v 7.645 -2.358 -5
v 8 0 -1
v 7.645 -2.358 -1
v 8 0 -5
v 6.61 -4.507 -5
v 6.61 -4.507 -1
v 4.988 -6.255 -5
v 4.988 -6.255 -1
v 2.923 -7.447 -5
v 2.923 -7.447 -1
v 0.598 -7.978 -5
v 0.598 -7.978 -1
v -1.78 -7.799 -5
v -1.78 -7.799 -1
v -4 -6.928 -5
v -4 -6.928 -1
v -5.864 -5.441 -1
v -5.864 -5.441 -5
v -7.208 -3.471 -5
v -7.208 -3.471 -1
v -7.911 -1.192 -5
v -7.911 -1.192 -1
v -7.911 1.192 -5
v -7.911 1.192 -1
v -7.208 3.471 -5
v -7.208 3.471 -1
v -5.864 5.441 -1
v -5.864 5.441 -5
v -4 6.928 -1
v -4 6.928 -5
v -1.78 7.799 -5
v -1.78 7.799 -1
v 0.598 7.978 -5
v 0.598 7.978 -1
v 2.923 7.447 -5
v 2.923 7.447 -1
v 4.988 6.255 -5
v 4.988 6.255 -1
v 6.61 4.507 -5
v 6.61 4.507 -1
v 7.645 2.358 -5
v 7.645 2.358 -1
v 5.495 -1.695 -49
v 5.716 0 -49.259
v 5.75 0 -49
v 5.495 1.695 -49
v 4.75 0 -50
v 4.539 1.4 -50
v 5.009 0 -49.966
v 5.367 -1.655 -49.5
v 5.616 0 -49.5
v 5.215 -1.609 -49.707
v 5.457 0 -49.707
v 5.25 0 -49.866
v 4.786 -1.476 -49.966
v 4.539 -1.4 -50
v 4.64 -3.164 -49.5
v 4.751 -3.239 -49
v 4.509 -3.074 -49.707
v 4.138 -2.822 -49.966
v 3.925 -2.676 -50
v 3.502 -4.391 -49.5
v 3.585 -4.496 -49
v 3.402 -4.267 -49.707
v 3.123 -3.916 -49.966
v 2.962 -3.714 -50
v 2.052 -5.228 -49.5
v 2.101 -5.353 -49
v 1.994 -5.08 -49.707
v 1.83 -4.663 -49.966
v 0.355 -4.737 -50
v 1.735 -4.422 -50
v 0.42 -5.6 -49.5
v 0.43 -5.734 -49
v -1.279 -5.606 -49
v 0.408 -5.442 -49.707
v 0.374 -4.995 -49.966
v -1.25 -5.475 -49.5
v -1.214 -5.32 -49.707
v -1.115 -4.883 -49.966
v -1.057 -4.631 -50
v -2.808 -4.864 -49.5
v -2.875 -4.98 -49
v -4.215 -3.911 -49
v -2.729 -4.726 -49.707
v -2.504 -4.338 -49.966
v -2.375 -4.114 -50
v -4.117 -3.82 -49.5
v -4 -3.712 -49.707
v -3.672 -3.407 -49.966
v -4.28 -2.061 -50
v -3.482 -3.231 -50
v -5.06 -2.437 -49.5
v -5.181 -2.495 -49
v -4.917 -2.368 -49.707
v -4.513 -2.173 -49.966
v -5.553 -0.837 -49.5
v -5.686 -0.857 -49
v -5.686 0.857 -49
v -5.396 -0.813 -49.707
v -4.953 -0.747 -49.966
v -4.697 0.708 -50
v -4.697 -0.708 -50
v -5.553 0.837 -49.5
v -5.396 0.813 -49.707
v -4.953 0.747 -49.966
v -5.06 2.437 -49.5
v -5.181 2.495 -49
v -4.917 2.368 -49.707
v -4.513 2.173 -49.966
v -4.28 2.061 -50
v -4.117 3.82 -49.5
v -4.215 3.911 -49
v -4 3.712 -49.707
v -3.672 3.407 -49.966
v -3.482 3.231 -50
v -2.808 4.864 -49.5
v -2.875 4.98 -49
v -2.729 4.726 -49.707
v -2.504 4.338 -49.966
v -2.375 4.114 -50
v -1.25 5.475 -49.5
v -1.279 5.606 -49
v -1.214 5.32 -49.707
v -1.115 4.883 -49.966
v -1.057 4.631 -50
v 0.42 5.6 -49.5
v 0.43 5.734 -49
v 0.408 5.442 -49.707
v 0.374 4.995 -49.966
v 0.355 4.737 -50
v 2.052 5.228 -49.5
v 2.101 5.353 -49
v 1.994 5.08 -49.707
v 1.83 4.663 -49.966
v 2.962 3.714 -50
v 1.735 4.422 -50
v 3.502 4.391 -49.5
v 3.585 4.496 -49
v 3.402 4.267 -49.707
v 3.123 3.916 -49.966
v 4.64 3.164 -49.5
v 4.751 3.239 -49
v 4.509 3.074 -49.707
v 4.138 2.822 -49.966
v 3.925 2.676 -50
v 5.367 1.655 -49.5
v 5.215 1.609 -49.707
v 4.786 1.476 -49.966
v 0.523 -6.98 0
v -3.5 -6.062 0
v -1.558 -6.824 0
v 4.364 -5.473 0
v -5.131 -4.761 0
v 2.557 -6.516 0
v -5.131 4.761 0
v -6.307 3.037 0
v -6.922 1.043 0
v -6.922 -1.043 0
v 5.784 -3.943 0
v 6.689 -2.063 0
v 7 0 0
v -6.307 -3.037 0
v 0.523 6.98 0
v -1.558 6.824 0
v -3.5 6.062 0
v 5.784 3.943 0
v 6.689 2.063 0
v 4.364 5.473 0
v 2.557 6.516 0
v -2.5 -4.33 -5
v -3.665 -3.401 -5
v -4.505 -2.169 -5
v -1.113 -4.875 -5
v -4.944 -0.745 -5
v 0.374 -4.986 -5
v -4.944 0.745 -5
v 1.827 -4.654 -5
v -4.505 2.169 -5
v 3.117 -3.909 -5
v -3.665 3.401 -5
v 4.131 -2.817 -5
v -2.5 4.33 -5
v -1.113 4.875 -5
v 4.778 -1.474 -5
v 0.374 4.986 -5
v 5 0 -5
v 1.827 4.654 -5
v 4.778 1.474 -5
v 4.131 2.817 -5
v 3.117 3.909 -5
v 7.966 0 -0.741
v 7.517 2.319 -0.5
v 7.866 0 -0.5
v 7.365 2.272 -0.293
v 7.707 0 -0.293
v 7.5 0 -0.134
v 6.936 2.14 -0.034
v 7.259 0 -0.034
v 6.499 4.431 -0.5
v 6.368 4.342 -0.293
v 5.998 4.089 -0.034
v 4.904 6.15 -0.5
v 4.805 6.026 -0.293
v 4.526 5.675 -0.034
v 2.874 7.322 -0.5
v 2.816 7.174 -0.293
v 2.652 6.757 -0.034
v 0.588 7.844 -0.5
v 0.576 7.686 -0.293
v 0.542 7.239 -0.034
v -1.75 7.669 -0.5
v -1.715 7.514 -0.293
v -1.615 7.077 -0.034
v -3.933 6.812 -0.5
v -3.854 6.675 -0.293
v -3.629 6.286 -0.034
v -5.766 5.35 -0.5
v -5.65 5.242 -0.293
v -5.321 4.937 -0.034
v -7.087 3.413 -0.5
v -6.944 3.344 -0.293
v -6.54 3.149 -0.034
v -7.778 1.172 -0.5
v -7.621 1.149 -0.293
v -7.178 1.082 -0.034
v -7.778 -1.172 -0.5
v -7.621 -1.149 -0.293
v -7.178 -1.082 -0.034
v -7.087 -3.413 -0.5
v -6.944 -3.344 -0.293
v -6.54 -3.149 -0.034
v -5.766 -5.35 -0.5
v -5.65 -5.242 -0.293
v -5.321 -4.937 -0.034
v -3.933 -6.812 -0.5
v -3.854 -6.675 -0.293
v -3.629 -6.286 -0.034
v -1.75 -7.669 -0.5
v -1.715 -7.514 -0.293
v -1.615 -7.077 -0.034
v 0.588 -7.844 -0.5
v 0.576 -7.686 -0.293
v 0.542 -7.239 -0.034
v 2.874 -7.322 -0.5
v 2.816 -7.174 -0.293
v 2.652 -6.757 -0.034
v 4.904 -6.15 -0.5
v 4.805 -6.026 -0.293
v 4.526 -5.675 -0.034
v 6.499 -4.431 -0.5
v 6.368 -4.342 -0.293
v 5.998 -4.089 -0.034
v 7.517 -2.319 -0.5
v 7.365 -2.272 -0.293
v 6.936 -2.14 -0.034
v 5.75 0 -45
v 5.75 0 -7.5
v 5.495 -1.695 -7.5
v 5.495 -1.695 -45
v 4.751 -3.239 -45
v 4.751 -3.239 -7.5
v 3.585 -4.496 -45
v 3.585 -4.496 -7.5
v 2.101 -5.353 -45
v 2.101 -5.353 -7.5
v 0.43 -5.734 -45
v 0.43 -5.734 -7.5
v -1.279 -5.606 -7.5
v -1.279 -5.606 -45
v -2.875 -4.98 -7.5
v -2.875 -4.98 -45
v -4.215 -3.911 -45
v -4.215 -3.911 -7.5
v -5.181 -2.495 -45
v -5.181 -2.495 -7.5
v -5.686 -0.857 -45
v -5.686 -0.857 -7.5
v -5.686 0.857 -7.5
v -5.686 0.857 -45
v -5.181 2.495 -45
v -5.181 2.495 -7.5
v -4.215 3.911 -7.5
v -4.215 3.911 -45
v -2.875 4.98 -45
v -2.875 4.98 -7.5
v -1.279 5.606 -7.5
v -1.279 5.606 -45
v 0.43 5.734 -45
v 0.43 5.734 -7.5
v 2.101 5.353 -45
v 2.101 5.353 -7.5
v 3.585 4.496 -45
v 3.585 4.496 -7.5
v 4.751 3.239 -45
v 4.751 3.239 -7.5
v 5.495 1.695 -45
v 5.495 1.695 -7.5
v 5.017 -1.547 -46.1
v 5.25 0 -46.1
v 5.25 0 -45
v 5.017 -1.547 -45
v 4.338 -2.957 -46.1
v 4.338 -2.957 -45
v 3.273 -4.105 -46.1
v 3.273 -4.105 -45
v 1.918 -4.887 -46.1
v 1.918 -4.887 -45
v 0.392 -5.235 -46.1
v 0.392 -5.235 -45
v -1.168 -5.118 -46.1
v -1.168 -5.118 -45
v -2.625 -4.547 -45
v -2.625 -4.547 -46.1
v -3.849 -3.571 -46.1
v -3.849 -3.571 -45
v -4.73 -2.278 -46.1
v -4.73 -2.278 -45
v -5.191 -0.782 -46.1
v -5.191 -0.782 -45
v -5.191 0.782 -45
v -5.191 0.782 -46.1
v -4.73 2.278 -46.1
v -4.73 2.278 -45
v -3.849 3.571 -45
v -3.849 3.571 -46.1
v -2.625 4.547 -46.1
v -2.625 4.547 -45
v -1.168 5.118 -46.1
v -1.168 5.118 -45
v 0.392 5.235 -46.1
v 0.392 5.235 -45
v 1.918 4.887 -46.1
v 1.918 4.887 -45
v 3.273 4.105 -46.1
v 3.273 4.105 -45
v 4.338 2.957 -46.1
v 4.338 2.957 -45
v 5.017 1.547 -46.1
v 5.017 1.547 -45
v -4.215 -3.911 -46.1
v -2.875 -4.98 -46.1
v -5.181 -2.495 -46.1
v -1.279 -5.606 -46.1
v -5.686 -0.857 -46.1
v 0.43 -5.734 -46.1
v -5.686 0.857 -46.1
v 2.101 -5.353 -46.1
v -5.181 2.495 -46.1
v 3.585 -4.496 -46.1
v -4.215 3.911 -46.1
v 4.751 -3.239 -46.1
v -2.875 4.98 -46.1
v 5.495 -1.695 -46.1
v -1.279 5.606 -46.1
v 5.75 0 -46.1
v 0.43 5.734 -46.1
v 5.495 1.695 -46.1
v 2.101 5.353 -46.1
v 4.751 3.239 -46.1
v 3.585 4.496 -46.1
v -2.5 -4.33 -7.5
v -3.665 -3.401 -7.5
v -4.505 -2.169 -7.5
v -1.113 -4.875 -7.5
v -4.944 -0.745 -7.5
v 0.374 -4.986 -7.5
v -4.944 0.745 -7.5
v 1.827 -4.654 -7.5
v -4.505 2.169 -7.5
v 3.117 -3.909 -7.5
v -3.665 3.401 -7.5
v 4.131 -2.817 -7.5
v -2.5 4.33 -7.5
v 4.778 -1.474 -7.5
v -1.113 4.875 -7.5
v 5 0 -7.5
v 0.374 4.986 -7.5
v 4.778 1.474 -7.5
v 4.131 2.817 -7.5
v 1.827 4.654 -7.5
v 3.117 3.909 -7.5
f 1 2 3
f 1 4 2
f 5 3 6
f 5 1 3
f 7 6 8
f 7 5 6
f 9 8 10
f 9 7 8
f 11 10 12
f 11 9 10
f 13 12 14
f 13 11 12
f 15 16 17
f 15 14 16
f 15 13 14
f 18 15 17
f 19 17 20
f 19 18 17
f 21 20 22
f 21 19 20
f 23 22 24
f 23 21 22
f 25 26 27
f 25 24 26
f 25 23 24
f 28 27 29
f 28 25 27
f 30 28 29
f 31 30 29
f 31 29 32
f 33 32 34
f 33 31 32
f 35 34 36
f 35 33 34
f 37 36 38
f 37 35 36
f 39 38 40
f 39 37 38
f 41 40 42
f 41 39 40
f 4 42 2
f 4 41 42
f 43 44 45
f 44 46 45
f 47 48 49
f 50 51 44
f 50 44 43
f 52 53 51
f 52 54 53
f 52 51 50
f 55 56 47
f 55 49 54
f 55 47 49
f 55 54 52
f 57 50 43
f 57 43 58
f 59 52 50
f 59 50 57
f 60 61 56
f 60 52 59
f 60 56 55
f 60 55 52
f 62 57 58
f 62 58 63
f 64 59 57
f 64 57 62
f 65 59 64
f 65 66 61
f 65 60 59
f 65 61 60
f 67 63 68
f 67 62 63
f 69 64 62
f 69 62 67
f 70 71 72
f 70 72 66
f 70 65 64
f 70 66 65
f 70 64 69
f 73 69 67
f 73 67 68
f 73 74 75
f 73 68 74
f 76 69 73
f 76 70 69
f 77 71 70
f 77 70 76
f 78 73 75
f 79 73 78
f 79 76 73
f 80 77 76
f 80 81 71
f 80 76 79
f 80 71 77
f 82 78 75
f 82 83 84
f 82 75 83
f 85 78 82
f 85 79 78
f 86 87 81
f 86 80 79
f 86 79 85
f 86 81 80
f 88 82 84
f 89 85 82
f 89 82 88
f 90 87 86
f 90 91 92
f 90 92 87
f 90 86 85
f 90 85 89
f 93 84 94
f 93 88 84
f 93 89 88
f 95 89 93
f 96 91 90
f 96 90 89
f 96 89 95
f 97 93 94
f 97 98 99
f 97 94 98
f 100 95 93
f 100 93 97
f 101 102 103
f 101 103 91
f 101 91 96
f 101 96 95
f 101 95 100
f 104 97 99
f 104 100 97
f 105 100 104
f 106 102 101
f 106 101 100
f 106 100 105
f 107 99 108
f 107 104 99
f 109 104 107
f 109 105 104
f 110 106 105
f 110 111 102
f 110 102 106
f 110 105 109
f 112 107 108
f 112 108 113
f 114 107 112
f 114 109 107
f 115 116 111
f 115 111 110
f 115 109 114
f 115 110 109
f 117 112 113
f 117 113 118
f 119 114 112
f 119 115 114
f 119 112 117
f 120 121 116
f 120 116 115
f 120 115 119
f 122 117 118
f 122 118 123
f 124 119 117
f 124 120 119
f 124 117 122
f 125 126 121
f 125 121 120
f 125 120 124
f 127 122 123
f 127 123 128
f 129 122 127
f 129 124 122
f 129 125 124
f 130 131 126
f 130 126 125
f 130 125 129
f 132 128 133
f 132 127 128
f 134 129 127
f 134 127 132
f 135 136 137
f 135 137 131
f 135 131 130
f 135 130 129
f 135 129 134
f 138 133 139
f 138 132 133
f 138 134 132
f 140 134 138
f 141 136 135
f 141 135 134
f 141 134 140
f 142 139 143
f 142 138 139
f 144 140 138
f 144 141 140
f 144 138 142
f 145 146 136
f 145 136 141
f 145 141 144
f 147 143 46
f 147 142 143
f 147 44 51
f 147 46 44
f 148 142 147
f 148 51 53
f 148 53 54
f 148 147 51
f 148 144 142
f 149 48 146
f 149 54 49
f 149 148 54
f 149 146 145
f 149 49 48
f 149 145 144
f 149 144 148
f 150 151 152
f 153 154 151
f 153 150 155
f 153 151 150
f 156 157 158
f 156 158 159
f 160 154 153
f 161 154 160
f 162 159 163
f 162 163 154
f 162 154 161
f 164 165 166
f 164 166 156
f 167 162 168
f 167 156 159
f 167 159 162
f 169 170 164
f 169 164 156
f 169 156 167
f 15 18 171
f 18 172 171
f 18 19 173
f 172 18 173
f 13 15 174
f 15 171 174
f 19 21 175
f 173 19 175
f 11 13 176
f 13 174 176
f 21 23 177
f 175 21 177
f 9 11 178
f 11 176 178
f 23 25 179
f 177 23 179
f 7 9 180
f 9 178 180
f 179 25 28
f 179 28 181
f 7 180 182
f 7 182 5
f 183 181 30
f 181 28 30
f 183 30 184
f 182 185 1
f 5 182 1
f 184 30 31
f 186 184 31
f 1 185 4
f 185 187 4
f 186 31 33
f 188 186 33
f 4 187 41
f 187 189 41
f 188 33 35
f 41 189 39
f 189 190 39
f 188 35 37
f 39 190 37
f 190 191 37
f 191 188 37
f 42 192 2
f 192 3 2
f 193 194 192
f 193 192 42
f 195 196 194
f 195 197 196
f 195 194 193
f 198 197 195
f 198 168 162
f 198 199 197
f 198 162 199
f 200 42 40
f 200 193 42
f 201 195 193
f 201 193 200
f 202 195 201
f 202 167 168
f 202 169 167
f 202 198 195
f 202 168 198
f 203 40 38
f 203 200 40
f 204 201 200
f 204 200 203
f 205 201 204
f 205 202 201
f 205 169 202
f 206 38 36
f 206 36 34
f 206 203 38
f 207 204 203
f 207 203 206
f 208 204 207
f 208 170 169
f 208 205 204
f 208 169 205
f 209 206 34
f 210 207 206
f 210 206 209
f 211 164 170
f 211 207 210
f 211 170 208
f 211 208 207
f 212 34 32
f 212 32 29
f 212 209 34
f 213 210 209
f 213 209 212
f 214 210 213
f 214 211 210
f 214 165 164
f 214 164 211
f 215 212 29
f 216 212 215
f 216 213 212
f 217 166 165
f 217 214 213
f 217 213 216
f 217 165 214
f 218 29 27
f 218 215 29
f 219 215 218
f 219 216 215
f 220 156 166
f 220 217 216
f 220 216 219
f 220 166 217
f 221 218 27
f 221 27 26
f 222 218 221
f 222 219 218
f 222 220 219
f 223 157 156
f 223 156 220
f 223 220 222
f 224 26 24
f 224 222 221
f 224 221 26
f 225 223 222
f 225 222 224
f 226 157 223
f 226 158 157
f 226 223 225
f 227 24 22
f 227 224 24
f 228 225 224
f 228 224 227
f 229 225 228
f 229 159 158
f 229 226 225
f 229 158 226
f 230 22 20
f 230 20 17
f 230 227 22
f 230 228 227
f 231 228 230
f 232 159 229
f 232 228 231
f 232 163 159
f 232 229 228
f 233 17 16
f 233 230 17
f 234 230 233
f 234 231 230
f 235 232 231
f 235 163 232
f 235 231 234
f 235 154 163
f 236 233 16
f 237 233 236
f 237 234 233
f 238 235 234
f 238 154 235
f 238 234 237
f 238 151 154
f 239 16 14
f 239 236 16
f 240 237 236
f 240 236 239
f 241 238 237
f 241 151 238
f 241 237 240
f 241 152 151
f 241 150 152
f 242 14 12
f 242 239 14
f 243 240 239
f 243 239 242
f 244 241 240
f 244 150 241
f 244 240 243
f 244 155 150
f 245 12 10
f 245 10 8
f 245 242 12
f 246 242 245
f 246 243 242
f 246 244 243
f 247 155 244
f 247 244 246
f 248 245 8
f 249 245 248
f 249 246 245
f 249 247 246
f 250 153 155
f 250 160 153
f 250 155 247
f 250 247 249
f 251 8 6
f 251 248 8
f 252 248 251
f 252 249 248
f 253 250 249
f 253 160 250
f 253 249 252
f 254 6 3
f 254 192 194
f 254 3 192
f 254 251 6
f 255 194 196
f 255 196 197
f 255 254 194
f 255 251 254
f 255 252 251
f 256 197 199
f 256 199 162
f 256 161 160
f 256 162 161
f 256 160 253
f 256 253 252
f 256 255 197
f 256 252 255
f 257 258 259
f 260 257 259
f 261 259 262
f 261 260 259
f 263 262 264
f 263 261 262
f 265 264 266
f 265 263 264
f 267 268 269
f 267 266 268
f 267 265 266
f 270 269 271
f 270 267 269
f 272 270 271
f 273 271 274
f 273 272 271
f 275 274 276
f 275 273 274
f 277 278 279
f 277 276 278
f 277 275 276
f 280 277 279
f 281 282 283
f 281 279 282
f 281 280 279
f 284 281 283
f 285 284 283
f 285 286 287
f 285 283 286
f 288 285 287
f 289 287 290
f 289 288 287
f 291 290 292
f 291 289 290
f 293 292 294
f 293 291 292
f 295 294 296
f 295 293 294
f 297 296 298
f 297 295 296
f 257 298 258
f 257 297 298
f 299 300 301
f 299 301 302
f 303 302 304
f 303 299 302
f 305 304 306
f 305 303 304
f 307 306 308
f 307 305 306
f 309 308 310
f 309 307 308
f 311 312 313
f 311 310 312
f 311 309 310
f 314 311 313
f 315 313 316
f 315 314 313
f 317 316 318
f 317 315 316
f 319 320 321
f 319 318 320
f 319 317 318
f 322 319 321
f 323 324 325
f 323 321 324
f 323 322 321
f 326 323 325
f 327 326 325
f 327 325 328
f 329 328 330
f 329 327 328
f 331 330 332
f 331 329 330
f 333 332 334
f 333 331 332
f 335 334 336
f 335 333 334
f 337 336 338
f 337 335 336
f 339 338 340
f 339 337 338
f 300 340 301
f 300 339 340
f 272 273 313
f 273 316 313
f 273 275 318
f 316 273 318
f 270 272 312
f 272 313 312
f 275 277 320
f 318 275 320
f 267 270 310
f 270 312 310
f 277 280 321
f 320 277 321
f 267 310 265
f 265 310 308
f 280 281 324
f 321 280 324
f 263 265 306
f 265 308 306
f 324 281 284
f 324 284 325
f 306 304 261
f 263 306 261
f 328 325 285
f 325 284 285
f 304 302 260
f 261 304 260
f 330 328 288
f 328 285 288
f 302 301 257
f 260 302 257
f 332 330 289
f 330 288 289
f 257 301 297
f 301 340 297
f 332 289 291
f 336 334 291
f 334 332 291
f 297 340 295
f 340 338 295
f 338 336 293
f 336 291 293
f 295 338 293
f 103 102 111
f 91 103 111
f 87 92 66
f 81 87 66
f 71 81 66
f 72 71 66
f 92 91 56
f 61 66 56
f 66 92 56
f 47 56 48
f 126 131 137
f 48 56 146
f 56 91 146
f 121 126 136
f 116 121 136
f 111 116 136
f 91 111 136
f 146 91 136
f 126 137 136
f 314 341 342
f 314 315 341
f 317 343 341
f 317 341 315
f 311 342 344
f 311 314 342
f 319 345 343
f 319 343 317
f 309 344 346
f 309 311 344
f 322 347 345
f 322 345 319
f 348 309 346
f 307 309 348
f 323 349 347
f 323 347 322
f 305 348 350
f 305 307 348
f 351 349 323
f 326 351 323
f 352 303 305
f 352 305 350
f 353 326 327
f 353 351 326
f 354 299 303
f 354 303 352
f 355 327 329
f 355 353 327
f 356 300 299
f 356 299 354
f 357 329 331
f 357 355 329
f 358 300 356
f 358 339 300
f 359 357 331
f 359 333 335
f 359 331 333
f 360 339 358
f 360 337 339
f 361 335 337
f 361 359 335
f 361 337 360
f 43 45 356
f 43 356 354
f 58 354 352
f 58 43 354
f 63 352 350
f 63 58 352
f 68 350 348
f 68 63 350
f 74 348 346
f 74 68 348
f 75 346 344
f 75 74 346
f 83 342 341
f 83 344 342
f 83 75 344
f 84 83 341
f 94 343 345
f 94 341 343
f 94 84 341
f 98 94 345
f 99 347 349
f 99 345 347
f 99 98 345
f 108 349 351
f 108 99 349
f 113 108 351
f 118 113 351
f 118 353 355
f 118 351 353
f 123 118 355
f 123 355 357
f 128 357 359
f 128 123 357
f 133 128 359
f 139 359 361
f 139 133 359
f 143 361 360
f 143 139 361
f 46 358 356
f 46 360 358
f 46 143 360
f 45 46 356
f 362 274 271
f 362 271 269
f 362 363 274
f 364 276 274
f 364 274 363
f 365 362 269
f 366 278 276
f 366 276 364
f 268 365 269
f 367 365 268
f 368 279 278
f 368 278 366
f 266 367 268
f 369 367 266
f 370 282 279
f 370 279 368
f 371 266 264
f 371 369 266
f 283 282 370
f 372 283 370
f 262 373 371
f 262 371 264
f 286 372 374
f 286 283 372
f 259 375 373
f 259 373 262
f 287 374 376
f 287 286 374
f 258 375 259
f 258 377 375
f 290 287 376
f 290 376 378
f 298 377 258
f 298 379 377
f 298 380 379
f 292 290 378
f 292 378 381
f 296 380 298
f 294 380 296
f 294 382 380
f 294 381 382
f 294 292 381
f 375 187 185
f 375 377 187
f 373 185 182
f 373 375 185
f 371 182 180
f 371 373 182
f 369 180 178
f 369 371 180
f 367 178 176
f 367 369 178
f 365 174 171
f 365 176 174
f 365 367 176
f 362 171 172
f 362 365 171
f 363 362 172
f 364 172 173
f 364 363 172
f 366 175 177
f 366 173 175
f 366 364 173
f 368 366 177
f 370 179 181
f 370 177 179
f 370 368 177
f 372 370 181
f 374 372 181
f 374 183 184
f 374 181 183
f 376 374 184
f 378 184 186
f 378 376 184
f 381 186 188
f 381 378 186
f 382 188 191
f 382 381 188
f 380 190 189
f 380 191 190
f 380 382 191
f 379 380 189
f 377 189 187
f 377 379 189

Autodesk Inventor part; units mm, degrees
ref_plane "YZ Plane" through (0, 0, 0) normal (1, 0, 0) x (0, 1, 0)
ref_plane "XZ Plane" through (0, 0, 0) normal (0, 1, 0) x (-1, 0, 0)
ref_plane "XY Plane" through (0, 0, 0) normal (0, 0, 1) x (1, 0, 0)
sketch "草图1" plane through (0, 0, 0) normal (0, 1, 0) x (-1, 0, 0)
  line L0 (0, 0) -> (-8, 0)
  line L1 (-8, 0) -> (-8, -5)
  line L2 (-8, -5) -> (0, -5)
  line L3 (0, -5) -> (0, 0)
  line L4 (0, -5) -> (-5, -5)
  line L5 (-5, -5) -> (-5, -7.5)
  line L6 (-5, -7.5) -> (0, -7.5)
  line L7 (0, -7.5) -> (0, -5)
  line L8 (0, -7.5) -> (-5.75, -7.5)
  line L9 (-5.75, -7.5) -> (-5.75, -45)
  line L10 (-5.75, -45) -> (0, -45)
  line L11 (0, -45) -> (0, -7.5)
  line L12 (0, -45) -> (-5.25, -45)
  line L13 (-5.25, -45) -> (-5.25, -46.1)
  line L14 (-5.25, -46.1) -> (0, -46.1)
  line L15 (0, -46.1) -> (0, -45)
  line L16 (0, -46.1) -> (-5.75, -46.1)
  line L17 (-5.75, -46.1) -> (-5.75, -50)
  line L18 (-5.75, -50) -> (0, -50)
  line L19 (0, -50) -> (0, -46.1)
  dimension "d0" = 8
  dimension "d1" = 5
  dimension "d2" = 5
  dimension "d3" = 2.5
  dimension "d4" = 5.75
  dimension "d5" = 37.5
  dimension "d6" = 5.25
  dimension "d7" = 1.1
  dimension "d8" = 5.75
  dimension "d9" = 3.9
revolve "旋转1" add sketch "草图1" angle 360 about axis through (0, 0, -45) along (0, 0, 1)
fillet "圆角1" radius 1 2 edges at (-8, 0, 0) (-5.75, 0, -50)
properties part number "6-鞘轴" material "不锈钢"
